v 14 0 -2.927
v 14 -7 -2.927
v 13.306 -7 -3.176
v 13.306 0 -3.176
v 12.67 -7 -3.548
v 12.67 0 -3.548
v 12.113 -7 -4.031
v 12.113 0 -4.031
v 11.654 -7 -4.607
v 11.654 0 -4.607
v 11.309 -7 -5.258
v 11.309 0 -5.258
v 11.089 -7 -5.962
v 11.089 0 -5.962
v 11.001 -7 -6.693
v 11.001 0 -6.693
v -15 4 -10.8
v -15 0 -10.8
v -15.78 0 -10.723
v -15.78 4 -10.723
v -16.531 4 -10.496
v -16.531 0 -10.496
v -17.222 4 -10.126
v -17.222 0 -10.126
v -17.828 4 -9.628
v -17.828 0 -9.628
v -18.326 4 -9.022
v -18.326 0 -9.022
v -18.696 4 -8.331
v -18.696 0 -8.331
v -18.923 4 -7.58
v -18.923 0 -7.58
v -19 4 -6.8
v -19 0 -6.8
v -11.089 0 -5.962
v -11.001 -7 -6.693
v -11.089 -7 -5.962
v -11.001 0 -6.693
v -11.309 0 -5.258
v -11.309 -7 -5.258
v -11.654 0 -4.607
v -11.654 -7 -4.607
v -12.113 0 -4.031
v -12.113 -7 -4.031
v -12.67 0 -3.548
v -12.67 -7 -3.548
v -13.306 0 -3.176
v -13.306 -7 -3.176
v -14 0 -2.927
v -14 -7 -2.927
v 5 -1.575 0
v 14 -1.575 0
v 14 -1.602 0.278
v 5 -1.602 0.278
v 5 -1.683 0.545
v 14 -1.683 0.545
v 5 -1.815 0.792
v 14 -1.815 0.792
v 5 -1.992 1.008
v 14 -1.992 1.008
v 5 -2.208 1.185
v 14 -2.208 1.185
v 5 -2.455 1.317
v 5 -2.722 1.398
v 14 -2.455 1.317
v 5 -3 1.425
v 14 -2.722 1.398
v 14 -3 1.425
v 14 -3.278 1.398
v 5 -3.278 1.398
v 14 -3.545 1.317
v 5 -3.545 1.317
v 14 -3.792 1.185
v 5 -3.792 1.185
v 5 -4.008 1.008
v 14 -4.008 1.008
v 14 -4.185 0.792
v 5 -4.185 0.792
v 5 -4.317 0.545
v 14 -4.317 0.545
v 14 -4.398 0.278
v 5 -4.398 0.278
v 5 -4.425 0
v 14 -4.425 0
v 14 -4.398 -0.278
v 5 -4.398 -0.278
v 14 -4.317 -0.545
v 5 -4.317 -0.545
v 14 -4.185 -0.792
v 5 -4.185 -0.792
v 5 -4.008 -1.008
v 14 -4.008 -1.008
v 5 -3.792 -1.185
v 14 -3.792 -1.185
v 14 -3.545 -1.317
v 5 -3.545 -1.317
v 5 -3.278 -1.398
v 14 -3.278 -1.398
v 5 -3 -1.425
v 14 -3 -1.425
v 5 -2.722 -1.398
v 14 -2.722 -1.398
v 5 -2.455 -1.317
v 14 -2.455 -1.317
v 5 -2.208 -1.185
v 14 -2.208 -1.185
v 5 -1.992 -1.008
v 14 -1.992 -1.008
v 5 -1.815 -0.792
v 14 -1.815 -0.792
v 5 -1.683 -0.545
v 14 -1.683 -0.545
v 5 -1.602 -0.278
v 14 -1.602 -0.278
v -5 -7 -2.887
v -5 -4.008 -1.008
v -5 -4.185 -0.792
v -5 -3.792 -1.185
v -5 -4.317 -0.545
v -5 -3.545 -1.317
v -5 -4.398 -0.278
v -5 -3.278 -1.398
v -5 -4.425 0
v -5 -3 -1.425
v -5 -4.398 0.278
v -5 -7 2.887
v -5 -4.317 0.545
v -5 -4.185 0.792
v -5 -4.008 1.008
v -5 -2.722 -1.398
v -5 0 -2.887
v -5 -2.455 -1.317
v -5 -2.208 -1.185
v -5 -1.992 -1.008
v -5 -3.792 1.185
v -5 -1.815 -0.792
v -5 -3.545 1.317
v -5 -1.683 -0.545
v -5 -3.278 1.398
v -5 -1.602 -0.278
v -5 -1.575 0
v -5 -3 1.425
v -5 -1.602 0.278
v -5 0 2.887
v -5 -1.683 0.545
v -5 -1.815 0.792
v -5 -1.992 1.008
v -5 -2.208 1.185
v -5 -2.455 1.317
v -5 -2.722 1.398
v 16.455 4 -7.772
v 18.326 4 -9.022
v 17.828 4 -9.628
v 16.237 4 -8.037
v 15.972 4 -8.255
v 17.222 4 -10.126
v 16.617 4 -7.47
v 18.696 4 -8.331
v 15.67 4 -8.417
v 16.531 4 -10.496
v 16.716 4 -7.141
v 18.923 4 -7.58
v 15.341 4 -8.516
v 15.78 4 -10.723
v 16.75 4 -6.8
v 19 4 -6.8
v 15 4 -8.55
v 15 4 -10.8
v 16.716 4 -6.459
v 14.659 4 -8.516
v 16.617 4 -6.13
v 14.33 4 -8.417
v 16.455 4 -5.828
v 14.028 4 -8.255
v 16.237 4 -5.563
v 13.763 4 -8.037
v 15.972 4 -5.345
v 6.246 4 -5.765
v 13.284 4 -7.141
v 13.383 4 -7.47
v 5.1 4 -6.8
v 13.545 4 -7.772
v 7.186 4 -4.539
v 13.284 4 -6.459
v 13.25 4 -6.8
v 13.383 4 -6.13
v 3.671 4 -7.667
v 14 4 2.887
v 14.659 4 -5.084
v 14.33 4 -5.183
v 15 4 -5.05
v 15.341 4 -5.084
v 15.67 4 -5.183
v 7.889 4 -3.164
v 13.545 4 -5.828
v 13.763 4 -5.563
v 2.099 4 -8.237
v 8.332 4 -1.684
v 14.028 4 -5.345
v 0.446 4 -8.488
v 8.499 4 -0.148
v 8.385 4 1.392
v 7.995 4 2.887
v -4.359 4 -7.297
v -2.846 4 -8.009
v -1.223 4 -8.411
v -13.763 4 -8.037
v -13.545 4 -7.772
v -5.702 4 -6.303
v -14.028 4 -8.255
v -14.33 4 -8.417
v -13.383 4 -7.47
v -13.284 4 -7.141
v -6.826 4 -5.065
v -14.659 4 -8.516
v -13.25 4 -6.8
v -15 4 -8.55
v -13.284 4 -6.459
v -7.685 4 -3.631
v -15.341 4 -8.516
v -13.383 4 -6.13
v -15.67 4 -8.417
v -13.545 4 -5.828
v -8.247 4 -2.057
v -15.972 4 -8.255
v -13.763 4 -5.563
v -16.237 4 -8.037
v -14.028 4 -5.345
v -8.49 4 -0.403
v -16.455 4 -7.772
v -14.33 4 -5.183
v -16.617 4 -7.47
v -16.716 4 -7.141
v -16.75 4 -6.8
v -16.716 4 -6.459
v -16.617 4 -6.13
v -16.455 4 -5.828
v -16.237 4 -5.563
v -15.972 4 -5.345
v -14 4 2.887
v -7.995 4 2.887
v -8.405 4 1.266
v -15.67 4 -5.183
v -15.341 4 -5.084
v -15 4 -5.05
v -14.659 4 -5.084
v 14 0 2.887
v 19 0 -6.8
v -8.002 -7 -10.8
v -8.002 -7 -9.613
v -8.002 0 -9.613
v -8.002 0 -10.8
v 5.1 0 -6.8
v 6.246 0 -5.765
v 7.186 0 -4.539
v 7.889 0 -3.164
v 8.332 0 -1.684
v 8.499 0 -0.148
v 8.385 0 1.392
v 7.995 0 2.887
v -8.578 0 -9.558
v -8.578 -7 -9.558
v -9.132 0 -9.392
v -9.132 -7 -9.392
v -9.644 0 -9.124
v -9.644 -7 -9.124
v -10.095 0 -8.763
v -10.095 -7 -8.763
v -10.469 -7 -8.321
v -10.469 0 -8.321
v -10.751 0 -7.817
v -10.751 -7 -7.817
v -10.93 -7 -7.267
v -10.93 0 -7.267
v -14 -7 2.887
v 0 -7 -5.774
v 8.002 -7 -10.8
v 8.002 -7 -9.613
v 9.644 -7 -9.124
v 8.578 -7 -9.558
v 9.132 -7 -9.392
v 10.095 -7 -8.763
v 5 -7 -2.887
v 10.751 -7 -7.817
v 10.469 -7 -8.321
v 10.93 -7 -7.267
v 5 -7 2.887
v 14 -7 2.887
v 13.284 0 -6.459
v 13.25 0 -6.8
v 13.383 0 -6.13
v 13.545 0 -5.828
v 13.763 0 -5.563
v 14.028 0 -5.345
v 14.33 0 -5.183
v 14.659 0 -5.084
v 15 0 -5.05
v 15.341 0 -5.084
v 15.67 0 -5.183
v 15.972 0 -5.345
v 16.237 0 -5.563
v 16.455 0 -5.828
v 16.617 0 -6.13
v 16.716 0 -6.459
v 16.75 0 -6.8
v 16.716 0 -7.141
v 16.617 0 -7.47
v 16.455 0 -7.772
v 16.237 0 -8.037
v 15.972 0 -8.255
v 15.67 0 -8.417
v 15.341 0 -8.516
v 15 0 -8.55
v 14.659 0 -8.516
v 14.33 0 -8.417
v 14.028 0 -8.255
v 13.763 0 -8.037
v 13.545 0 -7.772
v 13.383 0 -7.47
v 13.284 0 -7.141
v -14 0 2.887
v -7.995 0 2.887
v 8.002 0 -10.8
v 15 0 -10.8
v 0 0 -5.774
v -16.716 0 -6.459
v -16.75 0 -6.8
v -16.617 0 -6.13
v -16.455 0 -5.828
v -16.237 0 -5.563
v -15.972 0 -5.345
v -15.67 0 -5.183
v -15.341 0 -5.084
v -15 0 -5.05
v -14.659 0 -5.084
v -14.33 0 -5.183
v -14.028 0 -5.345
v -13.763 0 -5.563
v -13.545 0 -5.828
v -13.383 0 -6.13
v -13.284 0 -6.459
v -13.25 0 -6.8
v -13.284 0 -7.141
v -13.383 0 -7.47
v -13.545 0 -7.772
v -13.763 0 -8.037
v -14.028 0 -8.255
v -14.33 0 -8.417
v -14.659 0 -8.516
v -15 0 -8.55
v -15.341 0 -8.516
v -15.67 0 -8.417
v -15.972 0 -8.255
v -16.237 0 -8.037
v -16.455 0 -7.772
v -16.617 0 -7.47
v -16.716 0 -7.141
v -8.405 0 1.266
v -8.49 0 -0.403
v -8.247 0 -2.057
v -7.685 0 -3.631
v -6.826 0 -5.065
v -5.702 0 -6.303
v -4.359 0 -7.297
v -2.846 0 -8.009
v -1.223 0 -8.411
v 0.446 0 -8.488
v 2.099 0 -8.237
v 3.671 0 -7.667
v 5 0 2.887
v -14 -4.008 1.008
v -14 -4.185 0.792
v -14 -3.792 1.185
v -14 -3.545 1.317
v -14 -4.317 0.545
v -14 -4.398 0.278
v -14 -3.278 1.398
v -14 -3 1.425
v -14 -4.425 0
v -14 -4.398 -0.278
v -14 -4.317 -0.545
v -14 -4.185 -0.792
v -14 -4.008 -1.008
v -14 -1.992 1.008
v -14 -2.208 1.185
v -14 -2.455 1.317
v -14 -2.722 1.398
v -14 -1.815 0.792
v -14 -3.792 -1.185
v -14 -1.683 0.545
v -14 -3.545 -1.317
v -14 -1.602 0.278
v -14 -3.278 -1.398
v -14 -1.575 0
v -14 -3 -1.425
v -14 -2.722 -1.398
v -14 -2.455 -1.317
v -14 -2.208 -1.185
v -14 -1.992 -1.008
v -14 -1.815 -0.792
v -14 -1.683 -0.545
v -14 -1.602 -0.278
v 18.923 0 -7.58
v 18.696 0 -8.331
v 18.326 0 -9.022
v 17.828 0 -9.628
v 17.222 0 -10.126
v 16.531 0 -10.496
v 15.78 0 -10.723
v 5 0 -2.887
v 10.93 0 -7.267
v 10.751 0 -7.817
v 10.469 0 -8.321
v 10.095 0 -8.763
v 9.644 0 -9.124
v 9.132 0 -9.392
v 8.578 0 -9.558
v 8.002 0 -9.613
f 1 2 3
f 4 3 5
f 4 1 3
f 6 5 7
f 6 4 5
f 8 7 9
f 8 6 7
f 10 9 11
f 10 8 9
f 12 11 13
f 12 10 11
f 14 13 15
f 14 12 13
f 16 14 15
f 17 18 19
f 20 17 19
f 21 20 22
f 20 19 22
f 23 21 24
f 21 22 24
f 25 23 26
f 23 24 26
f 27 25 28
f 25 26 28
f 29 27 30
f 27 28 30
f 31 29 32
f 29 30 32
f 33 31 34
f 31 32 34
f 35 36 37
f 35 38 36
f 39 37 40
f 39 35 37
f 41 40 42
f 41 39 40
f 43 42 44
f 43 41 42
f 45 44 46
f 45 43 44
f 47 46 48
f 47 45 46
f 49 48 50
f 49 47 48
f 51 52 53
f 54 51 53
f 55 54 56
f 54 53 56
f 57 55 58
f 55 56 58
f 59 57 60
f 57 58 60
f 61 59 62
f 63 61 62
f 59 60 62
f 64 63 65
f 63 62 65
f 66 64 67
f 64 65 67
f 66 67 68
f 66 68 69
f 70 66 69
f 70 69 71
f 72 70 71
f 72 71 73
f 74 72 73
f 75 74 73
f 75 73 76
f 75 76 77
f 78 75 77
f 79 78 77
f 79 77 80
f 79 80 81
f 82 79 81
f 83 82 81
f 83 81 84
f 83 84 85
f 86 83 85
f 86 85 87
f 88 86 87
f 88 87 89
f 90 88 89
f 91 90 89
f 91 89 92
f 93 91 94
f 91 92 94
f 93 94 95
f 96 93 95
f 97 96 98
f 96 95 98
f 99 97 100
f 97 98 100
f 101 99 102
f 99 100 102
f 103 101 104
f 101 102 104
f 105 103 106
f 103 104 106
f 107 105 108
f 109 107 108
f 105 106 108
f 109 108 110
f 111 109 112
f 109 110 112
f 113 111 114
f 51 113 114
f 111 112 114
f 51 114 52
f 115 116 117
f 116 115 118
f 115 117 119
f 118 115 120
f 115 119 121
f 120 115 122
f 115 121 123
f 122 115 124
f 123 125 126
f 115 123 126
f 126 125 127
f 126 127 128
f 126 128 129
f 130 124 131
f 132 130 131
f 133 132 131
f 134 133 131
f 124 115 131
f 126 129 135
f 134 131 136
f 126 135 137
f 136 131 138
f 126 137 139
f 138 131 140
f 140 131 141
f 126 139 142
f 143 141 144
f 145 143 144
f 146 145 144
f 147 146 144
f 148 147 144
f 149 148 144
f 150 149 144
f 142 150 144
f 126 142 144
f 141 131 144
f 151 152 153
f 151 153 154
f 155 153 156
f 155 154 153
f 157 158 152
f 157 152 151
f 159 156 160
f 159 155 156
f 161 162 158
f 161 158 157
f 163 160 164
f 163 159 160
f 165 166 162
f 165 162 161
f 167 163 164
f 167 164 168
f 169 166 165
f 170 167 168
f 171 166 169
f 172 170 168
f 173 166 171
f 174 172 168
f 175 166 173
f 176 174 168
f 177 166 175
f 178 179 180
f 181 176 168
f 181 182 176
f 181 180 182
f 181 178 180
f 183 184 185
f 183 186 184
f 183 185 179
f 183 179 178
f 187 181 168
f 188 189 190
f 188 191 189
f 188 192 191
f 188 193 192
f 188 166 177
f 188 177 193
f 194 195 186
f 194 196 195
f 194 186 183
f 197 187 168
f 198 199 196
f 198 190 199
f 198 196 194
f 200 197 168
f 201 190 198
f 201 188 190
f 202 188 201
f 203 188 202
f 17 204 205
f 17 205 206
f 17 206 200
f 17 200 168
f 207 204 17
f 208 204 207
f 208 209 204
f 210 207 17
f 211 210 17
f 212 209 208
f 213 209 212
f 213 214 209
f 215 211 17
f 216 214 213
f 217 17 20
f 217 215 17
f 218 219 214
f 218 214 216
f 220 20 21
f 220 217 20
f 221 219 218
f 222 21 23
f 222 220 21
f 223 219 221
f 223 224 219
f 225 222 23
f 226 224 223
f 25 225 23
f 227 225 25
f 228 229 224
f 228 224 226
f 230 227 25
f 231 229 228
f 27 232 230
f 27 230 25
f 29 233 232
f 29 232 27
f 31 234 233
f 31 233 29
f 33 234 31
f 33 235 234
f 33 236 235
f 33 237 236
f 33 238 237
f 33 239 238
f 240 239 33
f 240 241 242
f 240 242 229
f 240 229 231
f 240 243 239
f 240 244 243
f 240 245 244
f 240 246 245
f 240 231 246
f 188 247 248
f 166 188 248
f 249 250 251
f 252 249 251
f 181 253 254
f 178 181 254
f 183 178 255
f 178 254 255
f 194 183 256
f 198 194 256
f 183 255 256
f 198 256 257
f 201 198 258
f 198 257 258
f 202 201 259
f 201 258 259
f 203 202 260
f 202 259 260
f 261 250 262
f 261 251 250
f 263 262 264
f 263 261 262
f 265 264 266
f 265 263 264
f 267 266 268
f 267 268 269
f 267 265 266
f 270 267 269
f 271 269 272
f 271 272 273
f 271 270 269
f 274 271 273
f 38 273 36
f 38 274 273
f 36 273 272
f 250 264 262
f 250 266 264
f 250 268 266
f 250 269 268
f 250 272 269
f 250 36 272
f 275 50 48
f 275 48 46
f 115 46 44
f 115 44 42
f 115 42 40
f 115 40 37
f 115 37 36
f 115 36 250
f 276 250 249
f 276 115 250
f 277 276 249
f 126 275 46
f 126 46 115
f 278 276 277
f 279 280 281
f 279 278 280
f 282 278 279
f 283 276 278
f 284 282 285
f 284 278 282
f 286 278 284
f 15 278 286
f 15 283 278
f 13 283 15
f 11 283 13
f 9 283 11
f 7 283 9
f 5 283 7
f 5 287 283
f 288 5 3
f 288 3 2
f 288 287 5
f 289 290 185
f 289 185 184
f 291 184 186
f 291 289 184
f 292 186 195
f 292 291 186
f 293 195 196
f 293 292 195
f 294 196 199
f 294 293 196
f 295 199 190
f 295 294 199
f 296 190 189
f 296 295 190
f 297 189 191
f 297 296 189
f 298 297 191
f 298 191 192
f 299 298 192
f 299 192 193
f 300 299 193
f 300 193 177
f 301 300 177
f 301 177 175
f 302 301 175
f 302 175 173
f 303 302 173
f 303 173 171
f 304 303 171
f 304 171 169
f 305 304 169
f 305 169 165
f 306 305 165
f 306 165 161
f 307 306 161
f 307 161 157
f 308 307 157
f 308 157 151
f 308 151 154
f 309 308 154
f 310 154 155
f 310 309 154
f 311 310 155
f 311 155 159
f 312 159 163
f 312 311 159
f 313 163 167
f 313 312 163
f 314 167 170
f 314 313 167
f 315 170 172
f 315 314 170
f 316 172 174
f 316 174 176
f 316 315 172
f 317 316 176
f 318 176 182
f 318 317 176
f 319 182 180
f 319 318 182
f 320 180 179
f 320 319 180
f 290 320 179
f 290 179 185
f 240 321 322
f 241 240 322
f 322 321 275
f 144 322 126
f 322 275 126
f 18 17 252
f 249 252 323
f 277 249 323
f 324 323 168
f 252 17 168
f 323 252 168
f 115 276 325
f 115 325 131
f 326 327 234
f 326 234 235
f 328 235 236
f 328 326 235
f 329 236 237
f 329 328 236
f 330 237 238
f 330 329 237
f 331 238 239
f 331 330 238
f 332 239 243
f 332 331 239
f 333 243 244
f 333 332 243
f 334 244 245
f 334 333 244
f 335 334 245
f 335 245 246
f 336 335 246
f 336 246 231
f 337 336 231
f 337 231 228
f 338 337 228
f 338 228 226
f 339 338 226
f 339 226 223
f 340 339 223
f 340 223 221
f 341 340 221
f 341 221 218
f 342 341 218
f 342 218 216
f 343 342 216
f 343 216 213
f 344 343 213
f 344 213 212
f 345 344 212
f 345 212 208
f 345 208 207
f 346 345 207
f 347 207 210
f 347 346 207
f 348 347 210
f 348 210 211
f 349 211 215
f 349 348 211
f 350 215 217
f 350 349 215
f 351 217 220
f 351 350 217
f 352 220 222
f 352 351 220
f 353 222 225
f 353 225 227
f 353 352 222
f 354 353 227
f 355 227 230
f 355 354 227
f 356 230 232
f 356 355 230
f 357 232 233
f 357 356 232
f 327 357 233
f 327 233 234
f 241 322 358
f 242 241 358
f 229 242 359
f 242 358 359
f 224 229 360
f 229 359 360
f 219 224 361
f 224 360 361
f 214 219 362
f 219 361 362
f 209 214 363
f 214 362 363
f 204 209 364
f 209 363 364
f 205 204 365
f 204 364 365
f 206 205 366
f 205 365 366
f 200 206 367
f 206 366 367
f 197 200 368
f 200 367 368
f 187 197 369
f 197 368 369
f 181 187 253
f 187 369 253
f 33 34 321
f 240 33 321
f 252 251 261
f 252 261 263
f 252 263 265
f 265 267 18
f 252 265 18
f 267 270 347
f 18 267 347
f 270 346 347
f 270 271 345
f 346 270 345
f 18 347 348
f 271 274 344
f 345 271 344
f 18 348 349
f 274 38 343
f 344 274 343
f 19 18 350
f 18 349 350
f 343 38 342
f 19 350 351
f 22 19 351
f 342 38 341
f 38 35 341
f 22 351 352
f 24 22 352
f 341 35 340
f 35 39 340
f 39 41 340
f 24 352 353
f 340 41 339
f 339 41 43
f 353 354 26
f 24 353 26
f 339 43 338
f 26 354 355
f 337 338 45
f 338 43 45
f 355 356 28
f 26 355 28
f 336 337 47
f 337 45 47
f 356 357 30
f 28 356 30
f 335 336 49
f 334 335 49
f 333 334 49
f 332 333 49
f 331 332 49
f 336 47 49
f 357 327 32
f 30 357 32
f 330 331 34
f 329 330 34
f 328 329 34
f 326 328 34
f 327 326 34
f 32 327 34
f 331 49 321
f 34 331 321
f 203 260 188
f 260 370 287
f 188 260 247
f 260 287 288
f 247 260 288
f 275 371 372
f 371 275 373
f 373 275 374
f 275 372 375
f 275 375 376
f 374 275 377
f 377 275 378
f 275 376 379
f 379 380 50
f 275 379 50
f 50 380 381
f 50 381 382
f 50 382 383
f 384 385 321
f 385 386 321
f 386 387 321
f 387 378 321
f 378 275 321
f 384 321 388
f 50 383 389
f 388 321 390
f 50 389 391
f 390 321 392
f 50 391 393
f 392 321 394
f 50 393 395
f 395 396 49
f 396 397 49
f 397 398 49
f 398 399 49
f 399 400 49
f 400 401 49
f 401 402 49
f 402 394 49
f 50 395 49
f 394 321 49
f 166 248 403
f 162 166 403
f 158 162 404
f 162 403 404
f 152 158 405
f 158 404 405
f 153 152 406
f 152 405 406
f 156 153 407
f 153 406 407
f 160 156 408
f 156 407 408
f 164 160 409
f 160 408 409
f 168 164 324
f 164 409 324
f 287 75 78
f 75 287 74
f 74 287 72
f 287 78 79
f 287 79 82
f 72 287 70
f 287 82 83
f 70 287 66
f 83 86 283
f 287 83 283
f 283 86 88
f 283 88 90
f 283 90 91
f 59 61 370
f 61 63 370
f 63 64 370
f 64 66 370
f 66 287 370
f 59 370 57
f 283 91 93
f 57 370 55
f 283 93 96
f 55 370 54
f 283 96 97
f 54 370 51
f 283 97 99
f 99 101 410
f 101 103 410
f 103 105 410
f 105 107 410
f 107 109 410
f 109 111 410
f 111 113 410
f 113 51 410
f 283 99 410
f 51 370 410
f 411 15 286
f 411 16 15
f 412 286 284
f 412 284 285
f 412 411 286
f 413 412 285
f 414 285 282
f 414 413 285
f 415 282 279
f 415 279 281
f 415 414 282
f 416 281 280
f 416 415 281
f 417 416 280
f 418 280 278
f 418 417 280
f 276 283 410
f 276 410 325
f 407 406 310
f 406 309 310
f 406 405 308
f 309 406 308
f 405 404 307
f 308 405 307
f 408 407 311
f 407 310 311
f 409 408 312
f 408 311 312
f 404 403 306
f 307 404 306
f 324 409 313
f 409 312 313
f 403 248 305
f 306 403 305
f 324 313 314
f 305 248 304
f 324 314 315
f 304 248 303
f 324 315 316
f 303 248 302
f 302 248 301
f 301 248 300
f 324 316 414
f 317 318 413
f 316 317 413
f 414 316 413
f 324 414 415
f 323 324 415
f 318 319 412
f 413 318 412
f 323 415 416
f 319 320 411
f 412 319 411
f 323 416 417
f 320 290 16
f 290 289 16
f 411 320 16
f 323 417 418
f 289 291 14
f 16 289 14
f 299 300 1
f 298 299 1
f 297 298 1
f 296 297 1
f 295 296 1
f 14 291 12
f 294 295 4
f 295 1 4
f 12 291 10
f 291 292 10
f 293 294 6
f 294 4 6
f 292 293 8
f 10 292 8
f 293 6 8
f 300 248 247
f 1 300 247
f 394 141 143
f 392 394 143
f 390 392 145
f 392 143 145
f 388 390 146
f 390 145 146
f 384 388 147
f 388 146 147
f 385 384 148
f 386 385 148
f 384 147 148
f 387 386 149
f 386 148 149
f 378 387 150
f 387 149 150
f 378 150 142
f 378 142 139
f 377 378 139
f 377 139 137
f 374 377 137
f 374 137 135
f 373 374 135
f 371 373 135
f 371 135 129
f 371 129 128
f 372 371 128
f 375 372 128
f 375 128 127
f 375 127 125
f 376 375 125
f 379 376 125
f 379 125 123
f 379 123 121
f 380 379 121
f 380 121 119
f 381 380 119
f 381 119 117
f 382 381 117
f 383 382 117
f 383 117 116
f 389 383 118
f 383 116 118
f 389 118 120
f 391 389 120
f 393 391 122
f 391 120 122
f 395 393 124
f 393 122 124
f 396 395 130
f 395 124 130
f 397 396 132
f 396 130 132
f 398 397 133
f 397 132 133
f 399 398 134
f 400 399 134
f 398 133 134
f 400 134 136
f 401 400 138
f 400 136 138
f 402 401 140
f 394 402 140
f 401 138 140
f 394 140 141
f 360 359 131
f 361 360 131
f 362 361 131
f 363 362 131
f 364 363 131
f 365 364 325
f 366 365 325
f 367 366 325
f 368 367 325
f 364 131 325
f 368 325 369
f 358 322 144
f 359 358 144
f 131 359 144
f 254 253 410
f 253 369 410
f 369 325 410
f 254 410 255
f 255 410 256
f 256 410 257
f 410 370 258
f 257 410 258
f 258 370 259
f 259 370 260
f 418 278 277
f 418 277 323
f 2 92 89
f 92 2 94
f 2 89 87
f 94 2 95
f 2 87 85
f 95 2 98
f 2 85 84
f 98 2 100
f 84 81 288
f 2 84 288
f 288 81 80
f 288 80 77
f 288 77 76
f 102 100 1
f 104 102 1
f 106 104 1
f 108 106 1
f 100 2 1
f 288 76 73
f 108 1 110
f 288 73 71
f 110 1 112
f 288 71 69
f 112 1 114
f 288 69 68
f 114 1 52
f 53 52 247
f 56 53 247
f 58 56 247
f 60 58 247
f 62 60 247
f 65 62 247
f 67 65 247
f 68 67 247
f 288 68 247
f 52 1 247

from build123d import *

# Parameters (mm, degrees)
F1_DEPTH = 7
F3_DEPTH = 34.2
F4_R     = 1.75
F5_DEPTH = 4
F6_R     = 4
F7_DEPTH = 25
F8_R     = 3
F9_DEPTH = 1.1867513459


with BuildPart() as f1:
    # F0 (on Front) → F1 (new body)
    with BuildSketch(Plane.XZ):
        Polygon((14, 2.8867513459), (5, 2.8867513459), (5, -2.8867513459), (0, -5.7735026919), (-5, -2.8867513459), (-5, 2.8867513459), (-14, 2.8867513459), (-14, -9.6132486541), (14, -9.6132486541), align=None)
    extrude(amount=F1_DEPTH)

    # F2 (on face) → F3 (cut)
    with BuildSketch(Plane.YZ.offset(14)):
        with BuildLine():
            ThreePointArc((-4.425, 0), (-3, -1.425), (-1.575, 0))
            Line((-1.575, 0), (-4.425, 0))
        make_face()
        with BuildLine():
            Line((-4.425, 0), (-1.575, 0))
            ThreePointArc((-1.575, 0), (-3, 1.425), (-4.425, 0))
        make_face()
    extrude(amount=-F3_DEPTH, mode=Mode.SUBTRACT)

    # F4 (on face) → F5 (join)
    with BuildSketch(Plane(origin=(0, 0, 0), x_dir=(-1, 0, 0), z_dir=(0, 1, 0))):
        with BuildLine():
            ThreePointArc((-5.1, -6.8), (-8.1441186755, -2.4337894321), (-7.9947899701, 2.8867513459))
            Line((-7.9947899701, 2.8867513459), (-14, 2.8867513459))
            Line((-14, 2.8867513459), (-19, -6.8))
            ThreePointArc((-19, -6.8), (-17.8284271247, -9.6284271247), (-15, -10.8))
            Line((-15, -10.8), (15, -10.8))
            ThreePointArc((15, -10.8), (17.8284271247, -9.6284271247), (19, -6.8))
            Line((19, -6.8), (14, 2.8867513459))
            Line((14, 2.8867513459), (7.9947899701, 2.8867513459))
            ThreePointArc((7.9947899701, 2.8867513459), (5.0550212811, -6.833502751), (-5.1, -6.8))
        make_face()
        with Locations((-15, -6.8)):
            Circle(F4_R, mode=Mode.SUBTRACT)
        with Locations((15, -6.8)):
            Circle(F4_R, mode=Mode.SUBTRACT)
    extrude(amount=F5_DEPTH)

    # F6 (on face) → F7 (cut)
    with BuildSketch(Plane.XZ):
        with Locations((-15, -6.8)):
            Circle(F6_R)
        with Locations((15, -6.8)):
            Circle(F6_R)
    extrude(amount=F7_DEPTH, mode=Mode.SUBTRACT)

    # F8
    f8_edges = [f1.edges().sort_by_distance(p)[0] for p in [
        (-12.156475, -3.5, -9.613249),
        (12.156475, -3.5, -9.613249),
    ]]
    fillet(f8_edges, radius=F8_R)

    # F9 (add, through all): a face of the model
    f9_faces = [f1.faces().sort_by_distance(p)[0] for p in [
        (0, -3.5, -9.6132486541),
    ]]
    extrude(f9_faces, amount=F9_DEPTH)


solid = f1.part
